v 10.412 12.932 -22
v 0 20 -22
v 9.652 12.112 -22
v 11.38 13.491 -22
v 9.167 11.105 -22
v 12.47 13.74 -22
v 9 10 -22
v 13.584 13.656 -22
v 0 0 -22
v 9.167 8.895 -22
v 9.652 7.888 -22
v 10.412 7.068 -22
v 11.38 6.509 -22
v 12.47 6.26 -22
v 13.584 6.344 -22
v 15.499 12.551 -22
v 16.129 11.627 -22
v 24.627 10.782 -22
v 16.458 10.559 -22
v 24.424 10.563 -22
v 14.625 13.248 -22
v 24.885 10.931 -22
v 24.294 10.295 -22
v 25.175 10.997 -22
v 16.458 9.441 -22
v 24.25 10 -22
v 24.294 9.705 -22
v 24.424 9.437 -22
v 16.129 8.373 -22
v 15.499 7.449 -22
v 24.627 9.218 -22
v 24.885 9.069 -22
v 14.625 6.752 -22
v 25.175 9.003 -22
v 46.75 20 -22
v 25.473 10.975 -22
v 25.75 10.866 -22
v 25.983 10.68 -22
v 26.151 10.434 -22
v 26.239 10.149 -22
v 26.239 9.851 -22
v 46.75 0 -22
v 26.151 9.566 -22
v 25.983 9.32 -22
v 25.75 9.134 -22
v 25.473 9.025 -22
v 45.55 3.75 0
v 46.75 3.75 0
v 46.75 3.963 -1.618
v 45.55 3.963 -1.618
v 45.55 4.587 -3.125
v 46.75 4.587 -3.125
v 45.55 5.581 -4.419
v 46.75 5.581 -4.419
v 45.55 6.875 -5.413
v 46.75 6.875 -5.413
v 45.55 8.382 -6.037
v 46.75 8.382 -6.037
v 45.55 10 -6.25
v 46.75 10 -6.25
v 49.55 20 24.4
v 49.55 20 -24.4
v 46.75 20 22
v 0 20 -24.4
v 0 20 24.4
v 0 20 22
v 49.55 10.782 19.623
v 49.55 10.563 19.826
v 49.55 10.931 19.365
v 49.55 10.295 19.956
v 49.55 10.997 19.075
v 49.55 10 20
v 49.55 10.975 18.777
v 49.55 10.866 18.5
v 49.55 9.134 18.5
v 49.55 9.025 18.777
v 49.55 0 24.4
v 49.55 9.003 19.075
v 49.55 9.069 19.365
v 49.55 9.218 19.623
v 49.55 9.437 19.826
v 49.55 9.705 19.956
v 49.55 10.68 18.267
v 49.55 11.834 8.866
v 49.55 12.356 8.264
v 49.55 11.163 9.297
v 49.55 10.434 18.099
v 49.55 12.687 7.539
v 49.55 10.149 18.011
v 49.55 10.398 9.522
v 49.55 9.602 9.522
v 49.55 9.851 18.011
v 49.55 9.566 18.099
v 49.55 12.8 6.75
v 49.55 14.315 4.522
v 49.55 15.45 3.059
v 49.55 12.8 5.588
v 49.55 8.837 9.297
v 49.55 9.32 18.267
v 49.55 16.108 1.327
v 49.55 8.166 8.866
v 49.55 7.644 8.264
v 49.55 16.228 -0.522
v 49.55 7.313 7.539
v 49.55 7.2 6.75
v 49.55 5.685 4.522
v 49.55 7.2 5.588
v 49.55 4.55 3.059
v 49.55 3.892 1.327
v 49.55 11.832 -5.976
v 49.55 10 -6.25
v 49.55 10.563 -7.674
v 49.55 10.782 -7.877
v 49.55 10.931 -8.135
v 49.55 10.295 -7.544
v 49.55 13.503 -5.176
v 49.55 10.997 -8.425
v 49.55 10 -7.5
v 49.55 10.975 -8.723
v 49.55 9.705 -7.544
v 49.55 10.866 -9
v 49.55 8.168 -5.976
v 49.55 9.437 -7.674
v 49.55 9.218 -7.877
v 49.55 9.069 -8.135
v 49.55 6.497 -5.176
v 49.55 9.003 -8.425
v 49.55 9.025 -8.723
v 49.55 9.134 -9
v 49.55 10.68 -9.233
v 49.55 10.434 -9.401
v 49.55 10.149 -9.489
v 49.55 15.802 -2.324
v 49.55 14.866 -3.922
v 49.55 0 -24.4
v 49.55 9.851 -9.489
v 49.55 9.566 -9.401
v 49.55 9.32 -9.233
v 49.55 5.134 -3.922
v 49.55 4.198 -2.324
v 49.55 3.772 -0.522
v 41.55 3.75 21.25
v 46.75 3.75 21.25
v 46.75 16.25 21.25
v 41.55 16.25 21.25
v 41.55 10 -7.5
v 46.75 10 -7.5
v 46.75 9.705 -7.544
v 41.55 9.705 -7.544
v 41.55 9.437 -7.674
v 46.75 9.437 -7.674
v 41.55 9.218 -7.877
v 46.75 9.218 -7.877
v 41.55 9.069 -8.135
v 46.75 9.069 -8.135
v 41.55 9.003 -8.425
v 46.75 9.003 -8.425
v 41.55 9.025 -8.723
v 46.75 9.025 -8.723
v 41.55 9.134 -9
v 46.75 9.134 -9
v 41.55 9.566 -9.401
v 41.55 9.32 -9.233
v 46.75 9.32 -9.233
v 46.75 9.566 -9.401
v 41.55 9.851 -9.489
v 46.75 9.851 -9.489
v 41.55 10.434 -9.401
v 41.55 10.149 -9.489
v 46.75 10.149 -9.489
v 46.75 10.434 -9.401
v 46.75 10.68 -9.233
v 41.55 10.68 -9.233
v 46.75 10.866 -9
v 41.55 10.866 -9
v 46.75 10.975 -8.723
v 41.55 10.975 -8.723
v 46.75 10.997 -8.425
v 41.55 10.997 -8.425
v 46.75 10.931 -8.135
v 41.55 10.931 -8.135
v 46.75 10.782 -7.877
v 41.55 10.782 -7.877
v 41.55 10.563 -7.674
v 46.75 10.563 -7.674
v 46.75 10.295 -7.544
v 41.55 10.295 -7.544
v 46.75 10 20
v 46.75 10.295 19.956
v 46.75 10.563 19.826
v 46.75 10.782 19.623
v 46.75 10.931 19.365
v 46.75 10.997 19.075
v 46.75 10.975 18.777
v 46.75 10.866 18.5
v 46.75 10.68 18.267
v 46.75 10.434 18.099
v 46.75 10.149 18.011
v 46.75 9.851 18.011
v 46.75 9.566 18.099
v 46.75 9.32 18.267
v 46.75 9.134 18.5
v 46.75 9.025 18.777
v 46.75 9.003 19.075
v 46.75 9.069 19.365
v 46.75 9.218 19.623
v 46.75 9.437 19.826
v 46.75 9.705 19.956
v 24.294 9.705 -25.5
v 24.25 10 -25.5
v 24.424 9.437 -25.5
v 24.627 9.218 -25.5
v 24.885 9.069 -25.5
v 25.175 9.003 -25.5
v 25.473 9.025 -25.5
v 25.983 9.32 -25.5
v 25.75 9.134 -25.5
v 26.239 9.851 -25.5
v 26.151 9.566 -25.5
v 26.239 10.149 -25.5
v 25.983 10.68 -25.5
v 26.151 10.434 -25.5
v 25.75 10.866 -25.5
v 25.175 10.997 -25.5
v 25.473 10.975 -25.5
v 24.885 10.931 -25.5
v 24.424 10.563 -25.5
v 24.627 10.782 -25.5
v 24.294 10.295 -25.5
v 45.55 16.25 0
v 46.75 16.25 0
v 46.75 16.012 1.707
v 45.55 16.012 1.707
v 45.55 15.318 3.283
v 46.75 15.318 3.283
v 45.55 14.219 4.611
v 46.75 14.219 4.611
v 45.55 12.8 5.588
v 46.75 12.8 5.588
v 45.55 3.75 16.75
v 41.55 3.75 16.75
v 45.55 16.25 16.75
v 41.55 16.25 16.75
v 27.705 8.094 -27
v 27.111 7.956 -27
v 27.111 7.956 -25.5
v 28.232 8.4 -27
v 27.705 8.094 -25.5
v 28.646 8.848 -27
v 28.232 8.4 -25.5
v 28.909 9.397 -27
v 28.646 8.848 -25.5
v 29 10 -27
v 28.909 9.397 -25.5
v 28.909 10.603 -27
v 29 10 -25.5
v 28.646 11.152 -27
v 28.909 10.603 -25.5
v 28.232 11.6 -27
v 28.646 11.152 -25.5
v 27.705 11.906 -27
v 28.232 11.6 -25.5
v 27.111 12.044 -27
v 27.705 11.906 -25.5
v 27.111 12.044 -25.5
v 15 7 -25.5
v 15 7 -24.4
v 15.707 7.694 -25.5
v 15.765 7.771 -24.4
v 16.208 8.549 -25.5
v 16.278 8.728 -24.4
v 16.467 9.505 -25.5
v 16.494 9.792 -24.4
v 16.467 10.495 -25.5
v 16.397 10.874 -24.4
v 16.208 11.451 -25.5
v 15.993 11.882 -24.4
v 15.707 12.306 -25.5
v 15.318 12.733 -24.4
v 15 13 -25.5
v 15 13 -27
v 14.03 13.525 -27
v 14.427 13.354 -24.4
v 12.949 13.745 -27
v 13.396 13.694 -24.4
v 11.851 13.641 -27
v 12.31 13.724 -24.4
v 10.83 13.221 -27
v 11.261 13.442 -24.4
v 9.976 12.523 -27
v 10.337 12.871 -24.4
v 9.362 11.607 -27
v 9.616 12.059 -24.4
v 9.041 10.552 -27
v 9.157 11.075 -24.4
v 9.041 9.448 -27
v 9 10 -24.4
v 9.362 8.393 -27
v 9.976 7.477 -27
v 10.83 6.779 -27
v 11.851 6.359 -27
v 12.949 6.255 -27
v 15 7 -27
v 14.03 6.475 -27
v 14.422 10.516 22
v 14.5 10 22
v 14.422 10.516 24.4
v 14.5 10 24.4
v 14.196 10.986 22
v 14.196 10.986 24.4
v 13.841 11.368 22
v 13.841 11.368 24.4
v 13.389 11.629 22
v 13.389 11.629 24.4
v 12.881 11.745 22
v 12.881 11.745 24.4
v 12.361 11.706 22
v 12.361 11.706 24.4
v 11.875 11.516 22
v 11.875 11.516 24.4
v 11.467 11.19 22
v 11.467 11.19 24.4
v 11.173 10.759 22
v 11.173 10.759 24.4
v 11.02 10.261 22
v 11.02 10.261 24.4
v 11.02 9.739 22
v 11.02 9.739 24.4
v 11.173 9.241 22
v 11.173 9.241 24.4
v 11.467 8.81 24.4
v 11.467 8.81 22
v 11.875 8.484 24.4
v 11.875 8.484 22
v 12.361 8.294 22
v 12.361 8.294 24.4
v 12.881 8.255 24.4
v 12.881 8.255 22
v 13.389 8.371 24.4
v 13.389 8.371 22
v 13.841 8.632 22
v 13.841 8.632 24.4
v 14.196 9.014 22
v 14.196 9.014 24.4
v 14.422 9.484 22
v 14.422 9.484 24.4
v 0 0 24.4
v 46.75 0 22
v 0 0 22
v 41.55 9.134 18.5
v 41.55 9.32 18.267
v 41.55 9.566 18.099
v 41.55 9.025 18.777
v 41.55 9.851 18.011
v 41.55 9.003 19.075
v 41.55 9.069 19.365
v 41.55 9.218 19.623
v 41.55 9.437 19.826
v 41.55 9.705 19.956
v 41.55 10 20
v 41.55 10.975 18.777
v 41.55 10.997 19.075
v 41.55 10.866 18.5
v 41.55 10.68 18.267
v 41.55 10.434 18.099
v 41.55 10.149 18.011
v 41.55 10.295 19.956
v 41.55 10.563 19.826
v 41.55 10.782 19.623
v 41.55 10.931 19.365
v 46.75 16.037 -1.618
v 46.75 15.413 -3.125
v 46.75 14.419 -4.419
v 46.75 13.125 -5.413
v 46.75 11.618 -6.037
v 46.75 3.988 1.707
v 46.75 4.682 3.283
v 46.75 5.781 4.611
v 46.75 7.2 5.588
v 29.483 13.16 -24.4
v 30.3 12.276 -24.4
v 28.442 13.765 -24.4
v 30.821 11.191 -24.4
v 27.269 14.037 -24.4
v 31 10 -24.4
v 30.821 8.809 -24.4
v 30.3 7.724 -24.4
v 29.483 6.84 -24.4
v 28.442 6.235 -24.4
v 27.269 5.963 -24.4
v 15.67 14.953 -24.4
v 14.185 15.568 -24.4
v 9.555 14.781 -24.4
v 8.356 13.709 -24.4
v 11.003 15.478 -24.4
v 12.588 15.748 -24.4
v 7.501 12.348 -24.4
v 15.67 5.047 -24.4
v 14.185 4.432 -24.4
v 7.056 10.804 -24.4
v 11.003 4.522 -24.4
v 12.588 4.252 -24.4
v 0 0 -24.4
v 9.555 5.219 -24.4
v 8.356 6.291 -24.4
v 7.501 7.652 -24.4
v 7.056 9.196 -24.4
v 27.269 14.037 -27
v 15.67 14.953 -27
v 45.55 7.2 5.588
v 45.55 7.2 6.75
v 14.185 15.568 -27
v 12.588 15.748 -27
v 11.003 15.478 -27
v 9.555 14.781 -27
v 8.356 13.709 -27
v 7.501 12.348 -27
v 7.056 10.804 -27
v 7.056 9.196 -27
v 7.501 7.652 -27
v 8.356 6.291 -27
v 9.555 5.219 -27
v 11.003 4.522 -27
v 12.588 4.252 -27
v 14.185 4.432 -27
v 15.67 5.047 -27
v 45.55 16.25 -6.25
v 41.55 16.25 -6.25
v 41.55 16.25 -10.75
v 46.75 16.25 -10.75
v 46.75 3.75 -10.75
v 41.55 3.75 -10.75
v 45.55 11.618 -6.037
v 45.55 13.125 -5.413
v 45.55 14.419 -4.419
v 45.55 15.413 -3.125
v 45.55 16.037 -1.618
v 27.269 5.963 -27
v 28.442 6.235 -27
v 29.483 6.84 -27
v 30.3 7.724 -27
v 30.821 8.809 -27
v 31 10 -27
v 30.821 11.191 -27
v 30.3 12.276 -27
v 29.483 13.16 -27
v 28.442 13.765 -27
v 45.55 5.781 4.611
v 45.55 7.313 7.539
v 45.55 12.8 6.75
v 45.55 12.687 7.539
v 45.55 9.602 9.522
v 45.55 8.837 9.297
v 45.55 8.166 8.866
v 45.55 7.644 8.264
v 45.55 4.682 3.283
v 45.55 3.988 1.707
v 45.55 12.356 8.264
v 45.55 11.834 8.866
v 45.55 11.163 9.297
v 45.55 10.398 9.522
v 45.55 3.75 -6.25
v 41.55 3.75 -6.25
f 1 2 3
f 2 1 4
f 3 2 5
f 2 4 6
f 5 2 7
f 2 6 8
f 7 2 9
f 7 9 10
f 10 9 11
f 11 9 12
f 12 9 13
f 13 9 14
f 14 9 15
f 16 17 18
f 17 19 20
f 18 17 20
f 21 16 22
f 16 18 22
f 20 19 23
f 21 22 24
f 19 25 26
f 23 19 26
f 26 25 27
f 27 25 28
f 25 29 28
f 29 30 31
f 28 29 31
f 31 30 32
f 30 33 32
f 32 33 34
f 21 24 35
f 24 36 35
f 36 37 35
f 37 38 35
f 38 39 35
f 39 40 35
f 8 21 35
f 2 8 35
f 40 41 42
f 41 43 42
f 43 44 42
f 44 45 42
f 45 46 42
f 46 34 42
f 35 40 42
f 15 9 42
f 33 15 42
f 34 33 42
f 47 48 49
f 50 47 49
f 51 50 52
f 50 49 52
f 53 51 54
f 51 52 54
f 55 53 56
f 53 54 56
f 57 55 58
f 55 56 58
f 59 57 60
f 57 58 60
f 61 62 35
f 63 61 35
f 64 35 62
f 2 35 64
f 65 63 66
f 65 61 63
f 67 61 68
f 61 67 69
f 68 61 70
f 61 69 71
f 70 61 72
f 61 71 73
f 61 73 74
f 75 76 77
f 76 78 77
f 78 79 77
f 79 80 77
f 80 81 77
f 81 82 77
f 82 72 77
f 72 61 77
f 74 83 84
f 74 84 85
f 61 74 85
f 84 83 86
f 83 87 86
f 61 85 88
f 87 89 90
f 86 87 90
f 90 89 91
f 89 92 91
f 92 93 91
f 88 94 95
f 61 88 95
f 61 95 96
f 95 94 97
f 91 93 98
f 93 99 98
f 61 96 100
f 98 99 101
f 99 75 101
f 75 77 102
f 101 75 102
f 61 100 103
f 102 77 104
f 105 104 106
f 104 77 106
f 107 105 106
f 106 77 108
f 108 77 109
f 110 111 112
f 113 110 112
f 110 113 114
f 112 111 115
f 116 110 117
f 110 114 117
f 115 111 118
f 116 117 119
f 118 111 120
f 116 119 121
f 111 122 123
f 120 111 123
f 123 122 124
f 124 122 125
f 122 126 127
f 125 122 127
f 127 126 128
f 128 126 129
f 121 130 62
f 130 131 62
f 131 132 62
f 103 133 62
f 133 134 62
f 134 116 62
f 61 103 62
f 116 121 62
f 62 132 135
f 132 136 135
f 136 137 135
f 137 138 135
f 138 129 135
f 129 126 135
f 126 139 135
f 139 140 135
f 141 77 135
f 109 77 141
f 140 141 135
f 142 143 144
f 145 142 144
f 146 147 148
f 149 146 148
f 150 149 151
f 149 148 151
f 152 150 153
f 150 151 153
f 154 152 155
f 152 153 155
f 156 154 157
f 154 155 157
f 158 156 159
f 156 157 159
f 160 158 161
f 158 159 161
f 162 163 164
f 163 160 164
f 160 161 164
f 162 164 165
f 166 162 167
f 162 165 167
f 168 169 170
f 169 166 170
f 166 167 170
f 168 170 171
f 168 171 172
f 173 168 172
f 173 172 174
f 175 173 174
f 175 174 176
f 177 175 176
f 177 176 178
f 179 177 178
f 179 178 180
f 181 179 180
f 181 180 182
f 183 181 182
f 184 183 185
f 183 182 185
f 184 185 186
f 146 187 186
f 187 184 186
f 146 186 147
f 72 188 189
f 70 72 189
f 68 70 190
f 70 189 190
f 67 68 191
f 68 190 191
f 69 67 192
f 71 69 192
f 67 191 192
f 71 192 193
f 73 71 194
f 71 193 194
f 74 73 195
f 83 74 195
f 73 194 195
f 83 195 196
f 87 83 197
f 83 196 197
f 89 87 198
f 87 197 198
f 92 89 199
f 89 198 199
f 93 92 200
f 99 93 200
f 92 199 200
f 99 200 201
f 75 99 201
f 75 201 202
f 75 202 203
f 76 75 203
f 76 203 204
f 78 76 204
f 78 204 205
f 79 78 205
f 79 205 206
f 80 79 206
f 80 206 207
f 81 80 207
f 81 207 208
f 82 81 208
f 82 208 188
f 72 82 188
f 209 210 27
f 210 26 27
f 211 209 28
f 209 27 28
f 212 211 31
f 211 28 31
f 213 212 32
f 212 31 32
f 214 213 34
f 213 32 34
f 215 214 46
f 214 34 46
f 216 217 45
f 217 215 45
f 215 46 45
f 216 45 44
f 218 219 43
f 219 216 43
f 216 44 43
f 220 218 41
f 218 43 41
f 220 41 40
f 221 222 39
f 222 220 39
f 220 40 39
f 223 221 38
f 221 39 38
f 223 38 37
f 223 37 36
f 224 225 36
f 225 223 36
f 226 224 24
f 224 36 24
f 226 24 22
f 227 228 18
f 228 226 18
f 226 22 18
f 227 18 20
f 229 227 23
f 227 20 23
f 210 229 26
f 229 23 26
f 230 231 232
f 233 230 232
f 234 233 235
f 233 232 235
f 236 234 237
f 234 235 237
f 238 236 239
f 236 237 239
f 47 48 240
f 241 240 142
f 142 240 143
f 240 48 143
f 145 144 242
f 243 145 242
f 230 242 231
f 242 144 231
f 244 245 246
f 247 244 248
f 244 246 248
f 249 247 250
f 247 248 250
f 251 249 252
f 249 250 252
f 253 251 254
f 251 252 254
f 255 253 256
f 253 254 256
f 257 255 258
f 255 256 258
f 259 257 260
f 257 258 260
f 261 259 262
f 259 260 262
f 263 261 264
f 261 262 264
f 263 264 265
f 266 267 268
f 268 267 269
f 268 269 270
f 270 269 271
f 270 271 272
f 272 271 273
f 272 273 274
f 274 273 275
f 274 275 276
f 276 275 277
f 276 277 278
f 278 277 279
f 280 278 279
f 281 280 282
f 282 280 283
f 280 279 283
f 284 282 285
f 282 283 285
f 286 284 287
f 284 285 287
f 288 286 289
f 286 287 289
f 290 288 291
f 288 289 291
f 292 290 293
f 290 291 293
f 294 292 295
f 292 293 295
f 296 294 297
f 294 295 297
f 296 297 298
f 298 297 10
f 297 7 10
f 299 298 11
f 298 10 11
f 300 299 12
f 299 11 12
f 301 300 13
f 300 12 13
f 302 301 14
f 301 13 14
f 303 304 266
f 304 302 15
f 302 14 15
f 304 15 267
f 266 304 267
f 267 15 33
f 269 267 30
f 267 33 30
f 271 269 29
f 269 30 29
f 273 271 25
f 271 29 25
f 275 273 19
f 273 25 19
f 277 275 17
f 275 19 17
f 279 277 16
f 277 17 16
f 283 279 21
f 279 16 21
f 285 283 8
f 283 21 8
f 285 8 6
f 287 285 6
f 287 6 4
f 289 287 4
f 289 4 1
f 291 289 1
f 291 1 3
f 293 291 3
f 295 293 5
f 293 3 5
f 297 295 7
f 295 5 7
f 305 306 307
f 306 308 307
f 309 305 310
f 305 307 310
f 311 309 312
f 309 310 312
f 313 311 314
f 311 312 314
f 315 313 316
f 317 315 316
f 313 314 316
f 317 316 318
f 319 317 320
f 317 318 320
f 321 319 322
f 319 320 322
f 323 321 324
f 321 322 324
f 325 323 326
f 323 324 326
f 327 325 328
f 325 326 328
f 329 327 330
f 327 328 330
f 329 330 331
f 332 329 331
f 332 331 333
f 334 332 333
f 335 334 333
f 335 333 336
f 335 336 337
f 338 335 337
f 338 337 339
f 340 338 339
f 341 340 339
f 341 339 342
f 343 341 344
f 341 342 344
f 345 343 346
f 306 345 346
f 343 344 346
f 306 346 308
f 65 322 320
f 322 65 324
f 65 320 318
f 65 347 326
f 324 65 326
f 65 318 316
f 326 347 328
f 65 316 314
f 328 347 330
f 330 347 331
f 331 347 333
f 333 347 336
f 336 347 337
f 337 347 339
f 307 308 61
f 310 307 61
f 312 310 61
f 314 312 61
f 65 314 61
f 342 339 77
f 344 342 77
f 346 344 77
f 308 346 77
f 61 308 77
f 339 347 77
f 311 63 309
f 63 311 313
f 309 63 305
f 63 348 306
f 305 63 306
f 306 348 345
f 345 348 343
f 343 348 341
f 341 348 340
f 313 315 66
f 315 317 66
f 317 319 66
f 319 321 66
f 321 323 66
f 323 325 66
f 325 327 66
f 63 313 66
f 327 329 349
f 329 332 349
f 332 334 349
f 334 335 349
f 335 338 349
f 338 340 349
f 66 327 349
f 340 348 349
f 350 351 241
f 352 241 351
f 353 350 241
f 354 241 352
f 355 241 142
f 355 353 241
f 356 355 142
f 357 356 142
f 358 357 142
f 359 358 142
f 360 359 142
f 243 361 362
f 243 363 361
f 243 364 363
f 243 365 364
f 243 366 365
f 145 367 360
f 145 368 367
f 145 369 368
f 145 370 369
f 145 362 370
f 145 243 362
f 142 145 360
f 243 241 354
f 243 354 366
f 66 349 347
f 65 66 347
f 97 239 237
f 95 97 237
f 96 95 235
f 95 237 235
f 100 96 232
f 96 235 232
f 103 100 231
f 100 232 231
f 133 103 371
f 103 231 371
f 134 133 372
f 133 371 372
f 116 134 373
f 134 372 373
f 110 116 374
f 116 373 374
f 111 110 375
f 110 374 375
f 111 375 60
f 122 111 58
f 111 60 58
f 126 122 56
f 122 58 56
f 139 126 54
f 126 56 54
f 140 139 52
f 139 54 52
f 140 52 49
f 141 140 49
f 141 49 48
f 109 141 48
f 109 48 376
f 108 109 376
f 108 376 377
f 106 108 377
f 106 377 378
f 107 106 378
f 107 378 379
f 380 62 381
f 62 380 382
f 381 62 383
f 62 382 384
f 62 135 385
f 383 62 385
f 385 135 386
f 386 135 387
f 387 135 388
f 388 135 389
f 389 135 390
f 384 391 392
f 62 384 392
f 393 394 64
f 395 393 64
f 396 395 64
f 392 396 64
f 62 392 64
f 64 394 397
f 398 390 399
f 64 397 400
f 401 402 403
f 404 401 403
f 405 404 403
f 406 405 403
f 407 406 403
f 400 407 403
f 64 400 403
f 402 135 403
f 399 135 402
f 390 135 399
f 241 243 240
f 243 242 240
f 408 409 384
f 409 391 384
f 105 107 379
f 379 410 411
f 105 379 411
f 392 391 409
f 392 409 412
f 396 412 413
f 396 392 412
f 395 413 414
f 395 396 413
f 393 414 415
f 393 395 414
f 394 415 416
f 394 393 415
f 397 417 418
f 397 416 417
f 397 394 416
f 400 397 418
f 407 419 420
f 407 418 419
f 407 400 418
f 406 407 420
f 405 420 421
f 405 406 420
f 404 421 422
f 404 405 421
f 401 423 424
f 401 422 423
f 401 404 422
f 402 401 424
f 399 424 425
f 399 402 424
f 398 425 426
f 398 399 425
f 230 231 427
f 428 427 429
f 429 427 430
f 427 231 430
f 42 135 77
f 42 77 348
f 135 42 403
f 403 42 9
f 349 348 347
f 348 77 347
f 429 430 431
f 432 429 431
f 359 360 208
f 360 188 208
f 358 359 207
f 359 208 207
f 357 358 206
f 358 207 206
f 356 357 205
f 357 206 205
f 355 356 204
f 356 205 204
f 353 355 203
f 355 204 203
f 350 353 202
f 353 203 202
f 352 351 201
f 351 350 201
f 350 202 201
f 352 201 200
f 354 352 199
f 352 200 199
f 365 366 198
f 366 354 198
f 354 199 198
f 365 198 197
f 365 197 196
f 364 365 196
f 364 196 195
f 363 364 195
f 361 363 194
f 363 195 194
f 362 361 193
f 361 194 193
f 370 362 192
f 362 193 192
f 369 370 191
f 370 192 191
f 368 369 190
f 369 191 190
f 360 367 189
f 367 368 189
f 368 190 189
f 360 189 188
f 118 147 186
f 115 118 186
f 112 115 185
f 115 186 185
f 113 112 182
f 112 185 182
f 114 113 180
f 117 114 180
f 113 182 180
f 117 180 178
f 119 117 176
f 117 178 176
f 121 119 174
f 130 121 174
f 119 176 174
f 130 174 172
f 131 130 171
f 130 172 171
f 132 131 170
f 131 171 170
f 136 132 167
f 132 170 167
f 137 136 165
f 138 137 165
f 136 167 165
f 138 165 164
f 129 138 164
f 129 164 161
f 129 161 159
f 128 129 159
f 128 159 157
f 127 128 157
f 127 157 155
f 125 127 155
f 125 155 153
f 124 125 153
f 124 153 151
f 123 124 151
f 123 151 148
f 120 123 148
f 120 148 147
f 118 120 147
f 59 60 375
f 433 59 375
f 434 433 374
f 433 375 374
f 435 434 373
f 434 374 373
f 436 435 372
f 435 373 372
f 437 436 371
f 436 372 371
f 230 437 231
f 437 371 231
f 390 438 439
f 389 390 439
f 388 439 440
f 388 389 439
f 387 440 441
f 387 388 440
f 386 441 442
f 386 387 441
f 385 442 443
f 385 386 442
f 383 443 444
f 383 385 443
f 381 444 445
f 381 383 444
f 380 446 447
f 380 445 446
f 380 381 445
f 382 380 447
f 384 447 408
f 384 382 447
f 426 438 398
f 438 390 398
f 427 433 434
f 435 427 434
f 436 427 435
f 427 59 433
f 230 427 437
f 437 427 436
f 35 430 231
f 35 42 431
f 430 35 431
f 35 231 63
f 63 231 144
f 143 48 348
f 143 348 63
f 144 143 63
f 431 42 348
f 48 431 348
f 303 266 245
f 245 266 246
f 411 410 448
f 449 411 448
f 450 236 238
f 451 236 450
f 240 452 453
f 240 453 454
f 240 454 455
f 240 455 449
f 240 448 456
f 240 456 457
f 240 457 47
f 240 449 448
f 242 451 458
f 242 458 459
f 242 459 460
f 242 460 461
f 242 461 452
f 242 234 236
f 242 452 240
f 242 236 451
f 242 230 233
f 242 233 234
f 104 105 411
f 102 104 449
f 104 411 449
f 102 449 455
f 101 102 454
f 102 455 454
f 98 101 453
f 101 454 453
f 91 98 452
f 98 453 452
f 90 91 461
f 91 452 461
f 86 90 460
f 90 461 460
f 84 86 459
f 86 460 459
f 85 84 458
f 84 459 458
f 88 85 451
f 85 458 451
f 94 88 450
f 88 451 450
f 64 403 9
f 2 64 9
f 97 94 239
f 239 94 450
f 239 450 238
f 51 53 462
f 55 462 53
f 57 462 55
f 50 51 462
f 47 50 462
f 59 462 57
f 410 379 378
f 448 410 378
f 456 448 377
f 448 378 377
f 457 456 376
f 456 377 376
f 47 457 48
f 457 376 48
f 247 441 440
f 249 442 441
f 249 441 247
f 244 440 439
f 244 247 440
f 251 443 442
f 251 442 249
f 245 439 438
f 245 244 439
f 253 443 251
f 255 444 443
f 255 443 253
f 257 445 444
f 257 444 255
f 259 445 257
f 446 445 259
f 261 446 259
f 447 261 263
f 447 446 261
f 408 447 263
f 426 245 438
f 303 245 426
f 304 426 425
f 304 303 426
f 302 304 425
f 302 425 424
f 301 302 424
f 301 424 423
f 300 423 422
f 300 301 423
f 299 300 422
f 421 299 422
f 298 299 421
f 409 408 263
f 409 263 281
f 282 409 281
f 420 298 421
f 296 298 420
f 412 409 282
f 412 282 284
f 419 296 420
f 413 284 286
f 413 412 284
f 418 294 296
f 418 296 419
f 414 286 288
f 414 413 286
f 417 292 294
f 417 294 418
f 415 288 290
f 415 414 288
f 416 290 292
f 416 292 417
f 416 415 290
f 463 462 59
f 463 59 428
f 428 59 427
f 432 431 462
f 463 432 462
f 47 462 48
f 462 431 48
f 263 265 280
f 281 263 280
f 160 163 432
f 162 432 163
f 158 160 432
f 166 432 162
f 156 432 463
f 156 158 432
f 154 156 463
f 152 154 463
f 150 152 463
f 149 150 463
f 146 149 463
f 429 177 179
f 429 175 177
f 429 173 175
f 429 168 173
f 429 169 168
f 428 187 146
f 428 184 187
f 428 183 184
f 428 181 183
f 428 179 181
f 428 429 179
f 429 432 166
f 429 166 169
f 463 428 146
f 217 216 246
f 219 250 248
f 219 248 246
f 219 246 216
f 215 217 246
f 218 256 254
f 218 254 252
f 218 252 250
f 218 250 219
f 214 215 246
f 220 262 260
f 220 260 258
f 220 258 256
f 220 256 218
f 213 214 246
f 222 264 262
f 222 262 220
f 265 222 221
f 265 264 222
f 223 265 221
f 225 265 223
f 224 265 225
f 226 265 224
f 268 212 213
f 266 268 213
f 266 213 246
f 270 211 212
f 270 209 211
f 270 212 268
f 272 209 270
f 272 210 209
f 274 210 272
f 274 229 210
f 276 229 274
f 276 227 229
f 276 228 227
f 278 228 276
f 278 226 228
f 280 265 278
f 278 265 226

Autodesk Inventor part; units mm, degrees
ref_plane "YZ Plane" through (0, 0, 0) normal (1, 0, 0) x (0, 1, 0)
ref_plane "XZ Plane" through (0, 0, 0) normal (0, 1, 0) x (-1, 0, 0)
ref_plane "XY Plane" through (0, 0, 0) normal (0, 0, 1) x (1, 0, 0)
sketch "スケッチ1" plane through (0, 0, 0) normal (0, 1, 0) x (-1, 0, 0)
  line L0 (0, 40.53276) -> (0, -53.904718)
  line L1 (35.916481, 0) -> (-80.691414, 0)
  line L2 (0, -24.4) -> (-49.55, -24.4)
  line L3 (-49.55, -24.4) -> (-49.55, 24.4)
  line L4 (-49.55, 24.4) -> (0, 24.4)
  line L5 (0, 24.4) -> (0, 22)
  line L6 (0, 22) -> (-46.75, 22)
  line L7 (-46.75, 22) -> (-46.75, -22)
  line L8 (-46.75, -22) -> (0, -22)
  line L9 (0, -24.4) -> (0, -22)
  line L10 (-12.75, -24.4) -> (-12.75, 24.4)
  point P0 (0, 0)
  dimension "d0" = 44
  dimension "d1" = 2.4
  dimension "d2" = 12.75
  dimension "d3" = 34
  dimension "d4" = 2.8
  dimension "d5" = 2.4
sketch "スケッチ1 outline for 押し出し1" plane through (0, 0, 0) normal (0, 1, 0) x (-1, 0, 0)
  line L0 (0, -22) -> (-46.75, -22)
  line L1 (0, -24.4) -> (0, -22)
  line L2 (-49.55, -24.4) -> (0, -24.4)
  line L3 (-49.55, 24.4) -> (-49.55, -24.4)
  line L4 (0, 24.4) -> (-49.55, 24.4)
  line L5 (0, 22) -> (0, 24.4)
  line L6 (-46.75, 22) -> (0, 22)
  line L7 (-46.75, -22) -> (-46.75, 22)
extrude "押し出し1" add sketch "スケッチ1 outline for 押し出し1" along normal blind 20
sketch "スケッチ2" plane through (49.55, 0, -24.4) normal (0, 0, -1) x (-1, 0, 0)
  line L0 (49.55, 20) -> (2.8, 20)
  line L1 (36.8, 20) -> (36.8, 0)
  line L2 (0, 0) -> (49.55, 0)
  line L3 (49.55, 0) -> (49.55, 20)
  line L4 (49.55, 10) -> (0, 10)
  line L5 (0, 0) -> (0, 20)
  circle A0 centre (36.8, 10) radius 3.75
  arc A1 (22.438626, 12.043639) -> (22.438626, 7.956361) centre (22.6, 10) ccw
  line L6 (34.55, 13) -> (22.438626, 12.043639)
  line L7 (34.55, 7) -> (22.438626, 7.956361)
  circle A2 centre (24.3, 10) radius 1
  circle A3 centre (36.8, 10) radius 5.75
  line L8 (33.879857, 14.953309) -> (22.281189, 14.037432)
  arc A4 (22.281189, 14.037432) -> (22.281189, 5.962568) centre (22.6, 10) ccw
  line L9 (22.281189, 5.962568) -> (33.879857, 5.046691)
  dimension "d9" = 7.5
  dimension "d8" = 12.75
  dimension "d10" = 2.05
  dimension "d11" = 14.2
  dimension "d12" = 12.5
  dimension "d13" = 2
  dimension "d14" = 6
  dimension "d43" = 2
  dimension "d44" = 2
sketch "スケッチ2 outline for 押し出し2" plane through (49.55, 0, -24.4) normal (0, 0, -1) x (-1, 0, 0)
  circle A0 centre (36.8, 10) radius 3.75
  circle A1 centre (24.3, 10) radius 1
extrude "押し出し2" cut sketch "スケッチ2 outline for 押し出し2" against normal up to surface (2.4 mm away)
sketch "スケッチ2 outline for 押し出し7" plane through (49.55, 0, -24.4) normal (0, 0, -1) x (-1, 0, 0)
  arc A0 (33.879857, 5.046691) -> (33.879857, 14.953309) centre (36.8, 10) ccw
  line L0 (22.281189, 5.962568) -> (33.879857, 5.046691)
  line L1 (33.879857, 14.953309) -> (22.281189, 14.037432)
  arc A1 (22.281189, 14.037432) -> (22.281189, 5.962568) centre (22.6, 10) ccw
  arc A2 (34.55, 13) -> (34.55, 7) centre (36.8, 10) cw
  line L2 (22.438626, 12.043639) -> (34.55, 13)
  arc A3 (22.438626, 7.956361) -> (22.438626, 12.043639) centre (22.6, 10) cw
  line L3 (34.55, 7) -> (22.438626, 7.956361)
extrude "押し出し7" add sketch "スケッチ2 outline for 押し出し7" along normal blind 2.6
sketch "スケッチ2 outline for 押し出し3" plane through (49.55, 0, -24.4) normal (0, 0, -1) x (-1, 0, 0)
  arc A0 (34.55, 7) -> (34.55, 13) centre (36.8, 10) cw
  line L0 (22.438626, 7.956361) -> (34.55, 7)
  line L1 (34.55, 13) -> (22.438626, 12.043639)
  arc A1 (22.438626, 12.043639) -> (22.438626, 7.956361) centre (22.6, 10) ccw
  circle A2 centre (24.3, 10) radius 1
extrude "押し出し3" add sketch "スケッチ2 outline for 押し出し3" along normal blind 1.1
sketch "スケッチ3" plane through (0, 0, 24.4) normal (0, 0, 1) x (1, 0, 0)
  circle A0 centre (12.75, 10) radius 3.75 projected
  circle A1 centre (12.75, 10) radius 1.75
  point P0 (0, 0)
  dimension "d19" = 3.5
sketch "スケッチ3 outline for 押し出し4" plane through (0, 0, 24.4) normal (0, 0, 1) x (1, 0, 0)
  circle A0 centre (12.75, 10) radius 1.75
extrude "押し出し4" cut sketch "スケッチ3 outline for 押し出し4" against normal up to surface (2.4 mm away)
sketch "スケッチ4" plane through (46.75, 0, -22) normal (-1, 0, 0) x (0, 0, 1)
  line L0 (22, 0) -> (22, 20)
  line L1 (0, 0) -> (0, 20)
  line L2 (0, 10) -> (44, 10)
  line L3 (44, 0) -> (44, 20)
  line L4 (43.25, 16.25) -> (11.25, 16.25)
  line L5 (11.25, 16.25) -> (11.25, 3.75)
  line L6 (11.25, 3.75) -> (43.25, 3.75)
  line L7 (43.25, 3.75) -> (43.25, 16.25)
  line L8 (15.75, 16.25) -> (15.75, 3.75)
  line L9 (38.75, 16.25) -> (38.75, 3.75)
  circle A0 centre (13.5, 10) radius 1
  circle A1 centre (41, 10) radius 1
  arc A2 (27.58771, 12.8) -> (27.58771, 7.2) centre (22, 10) ccw
  arc A3 (28.75, 7.2) -> (28.75, 12.8) centre (28.75, 10) ccw
  line L10 (28.75, 12.8) -> (27.58771, 12.8)
  line L11 (28.75, 7.2) -> (27.58771, 7.2)
  line L12 (15.75, 3.75) -> (15.75, 10)
  point P0 (22, 10)
  point P1 (15.75, 10)
  point P2 (22, 3.75)
  point P3 (22, 16.25)
  dimension "d22" = 4.5
  dimension "d23" = 4.5
  dimension "d24" = 23
  dimension "d25" = 12.5
  dimension "d29" = 2
  dimension "d30" = 2.25
  dimension "d31" = 2.25
  dimension "d39" = 13
  dimension "d40" = 2.8
sketch "スケッチ4 outline for 押し出し5" plane through (46.75, 0, -22) normal (-1, 0, 0) x (0, 0, 1)
  circle A0 centre (41, 10) radius 1
  circle A1 centre (13.5, 10) radius 1
  arc A2 (27.58771, 12.8) -> (27.58771, 7.2) centre (22, 10) ccw
  line L0 (28.75, 12.8) -> (27.58771, 12.8)
  arc A3 (28.75, 7.2) -> (28.75, 12.8) centre (28.75, 10) ccw
  line L1 (27.58771, 7.2) -> (28.75, 7.2)
extrude "押し出し5" cut sketch "スケッチ4 outline for 押し出し5" against normal through all
sketch "スケッチ4 outline for 押し出し8" plane through (46.75, 0, -22) normal (-1, 0, 0) x (0, 0, 1)
  line L0 (15.75, 10) -> (15.75, 3.75)
  arc A0 (22, 3.75) -> (15.75, 10) centre (22, 10) cw
  line L1 (15.75, 3.75) -> (22, 3.75)
  arc A1 (15.75, 10) -> (22, 16.25) centre (22, 10) cw
  line L2 (15.75, 16.25) -> (15.75, 10)
  line L3 (22, 16.25) -> (15.75, 16.25)
  line L4 (28.75, 7.2) -> (27.58771, 7.2)
  arc A2 (28.75, 12.8) -> (28.75, 7.2) centre (28.75, 10) cw
  line L5 (27.58771, 12.8) -> (28.75, 12.8)
  arc A3 (22, 16.25) -> (27.58771, 12.8) centre (22, 10) cw
  line L6 (38.75, 16.25) -> (22, 16.25)
  line L7 (38.75, 3.75) -> (38.75, 16.25)
  line L8 (22, 3.75) -> (38.75, 3.75)
  arc A4 (27.58771, 7.2) -> (22, 3.75) centre (22, 10) cw
extrude "押し出し8" add sketch "スケッチ4 outline for 押し出し8" along normal blind 1.2 contours A0 L1 L0 | L2 L3 A1 | A4 L4 A2 L5 A3 L6 L7 L8
sketch "スケッチ4 outline for 押し出し6" plane through (46.75, 0, -22) normal (-1, 0, 0) x (0, 0, 1)
  line L0 (43.25, 3.75) -> (43.25, 16.25)
  line L1 (38.75, 3.75) -> (43.25, 3.75)
  line L2 (43.25, 16.25) -> (38.75, 16.25)
  line L3 (38.75, 16.25) -> (38.75, 3.75)
  circle A0 centre (41, 10) radius 1
  line L4 (15.75, 3.75) -> (15.75, 16.25)
  line L5 (11.25, 3.75) -> (15.75, 3.75)
  line L6 (15.75, 16.25) -> (11.25, 16.25)
  line L7 (11.25, 16.25) -> (11.25, 3.75)
  circle A1 centre (13.5, 10) radius 1
extrude "押し出し6" add sketch "スケッチ4 outline for 押し出し6" along normal blind 5.2
properties part number "joint3"
